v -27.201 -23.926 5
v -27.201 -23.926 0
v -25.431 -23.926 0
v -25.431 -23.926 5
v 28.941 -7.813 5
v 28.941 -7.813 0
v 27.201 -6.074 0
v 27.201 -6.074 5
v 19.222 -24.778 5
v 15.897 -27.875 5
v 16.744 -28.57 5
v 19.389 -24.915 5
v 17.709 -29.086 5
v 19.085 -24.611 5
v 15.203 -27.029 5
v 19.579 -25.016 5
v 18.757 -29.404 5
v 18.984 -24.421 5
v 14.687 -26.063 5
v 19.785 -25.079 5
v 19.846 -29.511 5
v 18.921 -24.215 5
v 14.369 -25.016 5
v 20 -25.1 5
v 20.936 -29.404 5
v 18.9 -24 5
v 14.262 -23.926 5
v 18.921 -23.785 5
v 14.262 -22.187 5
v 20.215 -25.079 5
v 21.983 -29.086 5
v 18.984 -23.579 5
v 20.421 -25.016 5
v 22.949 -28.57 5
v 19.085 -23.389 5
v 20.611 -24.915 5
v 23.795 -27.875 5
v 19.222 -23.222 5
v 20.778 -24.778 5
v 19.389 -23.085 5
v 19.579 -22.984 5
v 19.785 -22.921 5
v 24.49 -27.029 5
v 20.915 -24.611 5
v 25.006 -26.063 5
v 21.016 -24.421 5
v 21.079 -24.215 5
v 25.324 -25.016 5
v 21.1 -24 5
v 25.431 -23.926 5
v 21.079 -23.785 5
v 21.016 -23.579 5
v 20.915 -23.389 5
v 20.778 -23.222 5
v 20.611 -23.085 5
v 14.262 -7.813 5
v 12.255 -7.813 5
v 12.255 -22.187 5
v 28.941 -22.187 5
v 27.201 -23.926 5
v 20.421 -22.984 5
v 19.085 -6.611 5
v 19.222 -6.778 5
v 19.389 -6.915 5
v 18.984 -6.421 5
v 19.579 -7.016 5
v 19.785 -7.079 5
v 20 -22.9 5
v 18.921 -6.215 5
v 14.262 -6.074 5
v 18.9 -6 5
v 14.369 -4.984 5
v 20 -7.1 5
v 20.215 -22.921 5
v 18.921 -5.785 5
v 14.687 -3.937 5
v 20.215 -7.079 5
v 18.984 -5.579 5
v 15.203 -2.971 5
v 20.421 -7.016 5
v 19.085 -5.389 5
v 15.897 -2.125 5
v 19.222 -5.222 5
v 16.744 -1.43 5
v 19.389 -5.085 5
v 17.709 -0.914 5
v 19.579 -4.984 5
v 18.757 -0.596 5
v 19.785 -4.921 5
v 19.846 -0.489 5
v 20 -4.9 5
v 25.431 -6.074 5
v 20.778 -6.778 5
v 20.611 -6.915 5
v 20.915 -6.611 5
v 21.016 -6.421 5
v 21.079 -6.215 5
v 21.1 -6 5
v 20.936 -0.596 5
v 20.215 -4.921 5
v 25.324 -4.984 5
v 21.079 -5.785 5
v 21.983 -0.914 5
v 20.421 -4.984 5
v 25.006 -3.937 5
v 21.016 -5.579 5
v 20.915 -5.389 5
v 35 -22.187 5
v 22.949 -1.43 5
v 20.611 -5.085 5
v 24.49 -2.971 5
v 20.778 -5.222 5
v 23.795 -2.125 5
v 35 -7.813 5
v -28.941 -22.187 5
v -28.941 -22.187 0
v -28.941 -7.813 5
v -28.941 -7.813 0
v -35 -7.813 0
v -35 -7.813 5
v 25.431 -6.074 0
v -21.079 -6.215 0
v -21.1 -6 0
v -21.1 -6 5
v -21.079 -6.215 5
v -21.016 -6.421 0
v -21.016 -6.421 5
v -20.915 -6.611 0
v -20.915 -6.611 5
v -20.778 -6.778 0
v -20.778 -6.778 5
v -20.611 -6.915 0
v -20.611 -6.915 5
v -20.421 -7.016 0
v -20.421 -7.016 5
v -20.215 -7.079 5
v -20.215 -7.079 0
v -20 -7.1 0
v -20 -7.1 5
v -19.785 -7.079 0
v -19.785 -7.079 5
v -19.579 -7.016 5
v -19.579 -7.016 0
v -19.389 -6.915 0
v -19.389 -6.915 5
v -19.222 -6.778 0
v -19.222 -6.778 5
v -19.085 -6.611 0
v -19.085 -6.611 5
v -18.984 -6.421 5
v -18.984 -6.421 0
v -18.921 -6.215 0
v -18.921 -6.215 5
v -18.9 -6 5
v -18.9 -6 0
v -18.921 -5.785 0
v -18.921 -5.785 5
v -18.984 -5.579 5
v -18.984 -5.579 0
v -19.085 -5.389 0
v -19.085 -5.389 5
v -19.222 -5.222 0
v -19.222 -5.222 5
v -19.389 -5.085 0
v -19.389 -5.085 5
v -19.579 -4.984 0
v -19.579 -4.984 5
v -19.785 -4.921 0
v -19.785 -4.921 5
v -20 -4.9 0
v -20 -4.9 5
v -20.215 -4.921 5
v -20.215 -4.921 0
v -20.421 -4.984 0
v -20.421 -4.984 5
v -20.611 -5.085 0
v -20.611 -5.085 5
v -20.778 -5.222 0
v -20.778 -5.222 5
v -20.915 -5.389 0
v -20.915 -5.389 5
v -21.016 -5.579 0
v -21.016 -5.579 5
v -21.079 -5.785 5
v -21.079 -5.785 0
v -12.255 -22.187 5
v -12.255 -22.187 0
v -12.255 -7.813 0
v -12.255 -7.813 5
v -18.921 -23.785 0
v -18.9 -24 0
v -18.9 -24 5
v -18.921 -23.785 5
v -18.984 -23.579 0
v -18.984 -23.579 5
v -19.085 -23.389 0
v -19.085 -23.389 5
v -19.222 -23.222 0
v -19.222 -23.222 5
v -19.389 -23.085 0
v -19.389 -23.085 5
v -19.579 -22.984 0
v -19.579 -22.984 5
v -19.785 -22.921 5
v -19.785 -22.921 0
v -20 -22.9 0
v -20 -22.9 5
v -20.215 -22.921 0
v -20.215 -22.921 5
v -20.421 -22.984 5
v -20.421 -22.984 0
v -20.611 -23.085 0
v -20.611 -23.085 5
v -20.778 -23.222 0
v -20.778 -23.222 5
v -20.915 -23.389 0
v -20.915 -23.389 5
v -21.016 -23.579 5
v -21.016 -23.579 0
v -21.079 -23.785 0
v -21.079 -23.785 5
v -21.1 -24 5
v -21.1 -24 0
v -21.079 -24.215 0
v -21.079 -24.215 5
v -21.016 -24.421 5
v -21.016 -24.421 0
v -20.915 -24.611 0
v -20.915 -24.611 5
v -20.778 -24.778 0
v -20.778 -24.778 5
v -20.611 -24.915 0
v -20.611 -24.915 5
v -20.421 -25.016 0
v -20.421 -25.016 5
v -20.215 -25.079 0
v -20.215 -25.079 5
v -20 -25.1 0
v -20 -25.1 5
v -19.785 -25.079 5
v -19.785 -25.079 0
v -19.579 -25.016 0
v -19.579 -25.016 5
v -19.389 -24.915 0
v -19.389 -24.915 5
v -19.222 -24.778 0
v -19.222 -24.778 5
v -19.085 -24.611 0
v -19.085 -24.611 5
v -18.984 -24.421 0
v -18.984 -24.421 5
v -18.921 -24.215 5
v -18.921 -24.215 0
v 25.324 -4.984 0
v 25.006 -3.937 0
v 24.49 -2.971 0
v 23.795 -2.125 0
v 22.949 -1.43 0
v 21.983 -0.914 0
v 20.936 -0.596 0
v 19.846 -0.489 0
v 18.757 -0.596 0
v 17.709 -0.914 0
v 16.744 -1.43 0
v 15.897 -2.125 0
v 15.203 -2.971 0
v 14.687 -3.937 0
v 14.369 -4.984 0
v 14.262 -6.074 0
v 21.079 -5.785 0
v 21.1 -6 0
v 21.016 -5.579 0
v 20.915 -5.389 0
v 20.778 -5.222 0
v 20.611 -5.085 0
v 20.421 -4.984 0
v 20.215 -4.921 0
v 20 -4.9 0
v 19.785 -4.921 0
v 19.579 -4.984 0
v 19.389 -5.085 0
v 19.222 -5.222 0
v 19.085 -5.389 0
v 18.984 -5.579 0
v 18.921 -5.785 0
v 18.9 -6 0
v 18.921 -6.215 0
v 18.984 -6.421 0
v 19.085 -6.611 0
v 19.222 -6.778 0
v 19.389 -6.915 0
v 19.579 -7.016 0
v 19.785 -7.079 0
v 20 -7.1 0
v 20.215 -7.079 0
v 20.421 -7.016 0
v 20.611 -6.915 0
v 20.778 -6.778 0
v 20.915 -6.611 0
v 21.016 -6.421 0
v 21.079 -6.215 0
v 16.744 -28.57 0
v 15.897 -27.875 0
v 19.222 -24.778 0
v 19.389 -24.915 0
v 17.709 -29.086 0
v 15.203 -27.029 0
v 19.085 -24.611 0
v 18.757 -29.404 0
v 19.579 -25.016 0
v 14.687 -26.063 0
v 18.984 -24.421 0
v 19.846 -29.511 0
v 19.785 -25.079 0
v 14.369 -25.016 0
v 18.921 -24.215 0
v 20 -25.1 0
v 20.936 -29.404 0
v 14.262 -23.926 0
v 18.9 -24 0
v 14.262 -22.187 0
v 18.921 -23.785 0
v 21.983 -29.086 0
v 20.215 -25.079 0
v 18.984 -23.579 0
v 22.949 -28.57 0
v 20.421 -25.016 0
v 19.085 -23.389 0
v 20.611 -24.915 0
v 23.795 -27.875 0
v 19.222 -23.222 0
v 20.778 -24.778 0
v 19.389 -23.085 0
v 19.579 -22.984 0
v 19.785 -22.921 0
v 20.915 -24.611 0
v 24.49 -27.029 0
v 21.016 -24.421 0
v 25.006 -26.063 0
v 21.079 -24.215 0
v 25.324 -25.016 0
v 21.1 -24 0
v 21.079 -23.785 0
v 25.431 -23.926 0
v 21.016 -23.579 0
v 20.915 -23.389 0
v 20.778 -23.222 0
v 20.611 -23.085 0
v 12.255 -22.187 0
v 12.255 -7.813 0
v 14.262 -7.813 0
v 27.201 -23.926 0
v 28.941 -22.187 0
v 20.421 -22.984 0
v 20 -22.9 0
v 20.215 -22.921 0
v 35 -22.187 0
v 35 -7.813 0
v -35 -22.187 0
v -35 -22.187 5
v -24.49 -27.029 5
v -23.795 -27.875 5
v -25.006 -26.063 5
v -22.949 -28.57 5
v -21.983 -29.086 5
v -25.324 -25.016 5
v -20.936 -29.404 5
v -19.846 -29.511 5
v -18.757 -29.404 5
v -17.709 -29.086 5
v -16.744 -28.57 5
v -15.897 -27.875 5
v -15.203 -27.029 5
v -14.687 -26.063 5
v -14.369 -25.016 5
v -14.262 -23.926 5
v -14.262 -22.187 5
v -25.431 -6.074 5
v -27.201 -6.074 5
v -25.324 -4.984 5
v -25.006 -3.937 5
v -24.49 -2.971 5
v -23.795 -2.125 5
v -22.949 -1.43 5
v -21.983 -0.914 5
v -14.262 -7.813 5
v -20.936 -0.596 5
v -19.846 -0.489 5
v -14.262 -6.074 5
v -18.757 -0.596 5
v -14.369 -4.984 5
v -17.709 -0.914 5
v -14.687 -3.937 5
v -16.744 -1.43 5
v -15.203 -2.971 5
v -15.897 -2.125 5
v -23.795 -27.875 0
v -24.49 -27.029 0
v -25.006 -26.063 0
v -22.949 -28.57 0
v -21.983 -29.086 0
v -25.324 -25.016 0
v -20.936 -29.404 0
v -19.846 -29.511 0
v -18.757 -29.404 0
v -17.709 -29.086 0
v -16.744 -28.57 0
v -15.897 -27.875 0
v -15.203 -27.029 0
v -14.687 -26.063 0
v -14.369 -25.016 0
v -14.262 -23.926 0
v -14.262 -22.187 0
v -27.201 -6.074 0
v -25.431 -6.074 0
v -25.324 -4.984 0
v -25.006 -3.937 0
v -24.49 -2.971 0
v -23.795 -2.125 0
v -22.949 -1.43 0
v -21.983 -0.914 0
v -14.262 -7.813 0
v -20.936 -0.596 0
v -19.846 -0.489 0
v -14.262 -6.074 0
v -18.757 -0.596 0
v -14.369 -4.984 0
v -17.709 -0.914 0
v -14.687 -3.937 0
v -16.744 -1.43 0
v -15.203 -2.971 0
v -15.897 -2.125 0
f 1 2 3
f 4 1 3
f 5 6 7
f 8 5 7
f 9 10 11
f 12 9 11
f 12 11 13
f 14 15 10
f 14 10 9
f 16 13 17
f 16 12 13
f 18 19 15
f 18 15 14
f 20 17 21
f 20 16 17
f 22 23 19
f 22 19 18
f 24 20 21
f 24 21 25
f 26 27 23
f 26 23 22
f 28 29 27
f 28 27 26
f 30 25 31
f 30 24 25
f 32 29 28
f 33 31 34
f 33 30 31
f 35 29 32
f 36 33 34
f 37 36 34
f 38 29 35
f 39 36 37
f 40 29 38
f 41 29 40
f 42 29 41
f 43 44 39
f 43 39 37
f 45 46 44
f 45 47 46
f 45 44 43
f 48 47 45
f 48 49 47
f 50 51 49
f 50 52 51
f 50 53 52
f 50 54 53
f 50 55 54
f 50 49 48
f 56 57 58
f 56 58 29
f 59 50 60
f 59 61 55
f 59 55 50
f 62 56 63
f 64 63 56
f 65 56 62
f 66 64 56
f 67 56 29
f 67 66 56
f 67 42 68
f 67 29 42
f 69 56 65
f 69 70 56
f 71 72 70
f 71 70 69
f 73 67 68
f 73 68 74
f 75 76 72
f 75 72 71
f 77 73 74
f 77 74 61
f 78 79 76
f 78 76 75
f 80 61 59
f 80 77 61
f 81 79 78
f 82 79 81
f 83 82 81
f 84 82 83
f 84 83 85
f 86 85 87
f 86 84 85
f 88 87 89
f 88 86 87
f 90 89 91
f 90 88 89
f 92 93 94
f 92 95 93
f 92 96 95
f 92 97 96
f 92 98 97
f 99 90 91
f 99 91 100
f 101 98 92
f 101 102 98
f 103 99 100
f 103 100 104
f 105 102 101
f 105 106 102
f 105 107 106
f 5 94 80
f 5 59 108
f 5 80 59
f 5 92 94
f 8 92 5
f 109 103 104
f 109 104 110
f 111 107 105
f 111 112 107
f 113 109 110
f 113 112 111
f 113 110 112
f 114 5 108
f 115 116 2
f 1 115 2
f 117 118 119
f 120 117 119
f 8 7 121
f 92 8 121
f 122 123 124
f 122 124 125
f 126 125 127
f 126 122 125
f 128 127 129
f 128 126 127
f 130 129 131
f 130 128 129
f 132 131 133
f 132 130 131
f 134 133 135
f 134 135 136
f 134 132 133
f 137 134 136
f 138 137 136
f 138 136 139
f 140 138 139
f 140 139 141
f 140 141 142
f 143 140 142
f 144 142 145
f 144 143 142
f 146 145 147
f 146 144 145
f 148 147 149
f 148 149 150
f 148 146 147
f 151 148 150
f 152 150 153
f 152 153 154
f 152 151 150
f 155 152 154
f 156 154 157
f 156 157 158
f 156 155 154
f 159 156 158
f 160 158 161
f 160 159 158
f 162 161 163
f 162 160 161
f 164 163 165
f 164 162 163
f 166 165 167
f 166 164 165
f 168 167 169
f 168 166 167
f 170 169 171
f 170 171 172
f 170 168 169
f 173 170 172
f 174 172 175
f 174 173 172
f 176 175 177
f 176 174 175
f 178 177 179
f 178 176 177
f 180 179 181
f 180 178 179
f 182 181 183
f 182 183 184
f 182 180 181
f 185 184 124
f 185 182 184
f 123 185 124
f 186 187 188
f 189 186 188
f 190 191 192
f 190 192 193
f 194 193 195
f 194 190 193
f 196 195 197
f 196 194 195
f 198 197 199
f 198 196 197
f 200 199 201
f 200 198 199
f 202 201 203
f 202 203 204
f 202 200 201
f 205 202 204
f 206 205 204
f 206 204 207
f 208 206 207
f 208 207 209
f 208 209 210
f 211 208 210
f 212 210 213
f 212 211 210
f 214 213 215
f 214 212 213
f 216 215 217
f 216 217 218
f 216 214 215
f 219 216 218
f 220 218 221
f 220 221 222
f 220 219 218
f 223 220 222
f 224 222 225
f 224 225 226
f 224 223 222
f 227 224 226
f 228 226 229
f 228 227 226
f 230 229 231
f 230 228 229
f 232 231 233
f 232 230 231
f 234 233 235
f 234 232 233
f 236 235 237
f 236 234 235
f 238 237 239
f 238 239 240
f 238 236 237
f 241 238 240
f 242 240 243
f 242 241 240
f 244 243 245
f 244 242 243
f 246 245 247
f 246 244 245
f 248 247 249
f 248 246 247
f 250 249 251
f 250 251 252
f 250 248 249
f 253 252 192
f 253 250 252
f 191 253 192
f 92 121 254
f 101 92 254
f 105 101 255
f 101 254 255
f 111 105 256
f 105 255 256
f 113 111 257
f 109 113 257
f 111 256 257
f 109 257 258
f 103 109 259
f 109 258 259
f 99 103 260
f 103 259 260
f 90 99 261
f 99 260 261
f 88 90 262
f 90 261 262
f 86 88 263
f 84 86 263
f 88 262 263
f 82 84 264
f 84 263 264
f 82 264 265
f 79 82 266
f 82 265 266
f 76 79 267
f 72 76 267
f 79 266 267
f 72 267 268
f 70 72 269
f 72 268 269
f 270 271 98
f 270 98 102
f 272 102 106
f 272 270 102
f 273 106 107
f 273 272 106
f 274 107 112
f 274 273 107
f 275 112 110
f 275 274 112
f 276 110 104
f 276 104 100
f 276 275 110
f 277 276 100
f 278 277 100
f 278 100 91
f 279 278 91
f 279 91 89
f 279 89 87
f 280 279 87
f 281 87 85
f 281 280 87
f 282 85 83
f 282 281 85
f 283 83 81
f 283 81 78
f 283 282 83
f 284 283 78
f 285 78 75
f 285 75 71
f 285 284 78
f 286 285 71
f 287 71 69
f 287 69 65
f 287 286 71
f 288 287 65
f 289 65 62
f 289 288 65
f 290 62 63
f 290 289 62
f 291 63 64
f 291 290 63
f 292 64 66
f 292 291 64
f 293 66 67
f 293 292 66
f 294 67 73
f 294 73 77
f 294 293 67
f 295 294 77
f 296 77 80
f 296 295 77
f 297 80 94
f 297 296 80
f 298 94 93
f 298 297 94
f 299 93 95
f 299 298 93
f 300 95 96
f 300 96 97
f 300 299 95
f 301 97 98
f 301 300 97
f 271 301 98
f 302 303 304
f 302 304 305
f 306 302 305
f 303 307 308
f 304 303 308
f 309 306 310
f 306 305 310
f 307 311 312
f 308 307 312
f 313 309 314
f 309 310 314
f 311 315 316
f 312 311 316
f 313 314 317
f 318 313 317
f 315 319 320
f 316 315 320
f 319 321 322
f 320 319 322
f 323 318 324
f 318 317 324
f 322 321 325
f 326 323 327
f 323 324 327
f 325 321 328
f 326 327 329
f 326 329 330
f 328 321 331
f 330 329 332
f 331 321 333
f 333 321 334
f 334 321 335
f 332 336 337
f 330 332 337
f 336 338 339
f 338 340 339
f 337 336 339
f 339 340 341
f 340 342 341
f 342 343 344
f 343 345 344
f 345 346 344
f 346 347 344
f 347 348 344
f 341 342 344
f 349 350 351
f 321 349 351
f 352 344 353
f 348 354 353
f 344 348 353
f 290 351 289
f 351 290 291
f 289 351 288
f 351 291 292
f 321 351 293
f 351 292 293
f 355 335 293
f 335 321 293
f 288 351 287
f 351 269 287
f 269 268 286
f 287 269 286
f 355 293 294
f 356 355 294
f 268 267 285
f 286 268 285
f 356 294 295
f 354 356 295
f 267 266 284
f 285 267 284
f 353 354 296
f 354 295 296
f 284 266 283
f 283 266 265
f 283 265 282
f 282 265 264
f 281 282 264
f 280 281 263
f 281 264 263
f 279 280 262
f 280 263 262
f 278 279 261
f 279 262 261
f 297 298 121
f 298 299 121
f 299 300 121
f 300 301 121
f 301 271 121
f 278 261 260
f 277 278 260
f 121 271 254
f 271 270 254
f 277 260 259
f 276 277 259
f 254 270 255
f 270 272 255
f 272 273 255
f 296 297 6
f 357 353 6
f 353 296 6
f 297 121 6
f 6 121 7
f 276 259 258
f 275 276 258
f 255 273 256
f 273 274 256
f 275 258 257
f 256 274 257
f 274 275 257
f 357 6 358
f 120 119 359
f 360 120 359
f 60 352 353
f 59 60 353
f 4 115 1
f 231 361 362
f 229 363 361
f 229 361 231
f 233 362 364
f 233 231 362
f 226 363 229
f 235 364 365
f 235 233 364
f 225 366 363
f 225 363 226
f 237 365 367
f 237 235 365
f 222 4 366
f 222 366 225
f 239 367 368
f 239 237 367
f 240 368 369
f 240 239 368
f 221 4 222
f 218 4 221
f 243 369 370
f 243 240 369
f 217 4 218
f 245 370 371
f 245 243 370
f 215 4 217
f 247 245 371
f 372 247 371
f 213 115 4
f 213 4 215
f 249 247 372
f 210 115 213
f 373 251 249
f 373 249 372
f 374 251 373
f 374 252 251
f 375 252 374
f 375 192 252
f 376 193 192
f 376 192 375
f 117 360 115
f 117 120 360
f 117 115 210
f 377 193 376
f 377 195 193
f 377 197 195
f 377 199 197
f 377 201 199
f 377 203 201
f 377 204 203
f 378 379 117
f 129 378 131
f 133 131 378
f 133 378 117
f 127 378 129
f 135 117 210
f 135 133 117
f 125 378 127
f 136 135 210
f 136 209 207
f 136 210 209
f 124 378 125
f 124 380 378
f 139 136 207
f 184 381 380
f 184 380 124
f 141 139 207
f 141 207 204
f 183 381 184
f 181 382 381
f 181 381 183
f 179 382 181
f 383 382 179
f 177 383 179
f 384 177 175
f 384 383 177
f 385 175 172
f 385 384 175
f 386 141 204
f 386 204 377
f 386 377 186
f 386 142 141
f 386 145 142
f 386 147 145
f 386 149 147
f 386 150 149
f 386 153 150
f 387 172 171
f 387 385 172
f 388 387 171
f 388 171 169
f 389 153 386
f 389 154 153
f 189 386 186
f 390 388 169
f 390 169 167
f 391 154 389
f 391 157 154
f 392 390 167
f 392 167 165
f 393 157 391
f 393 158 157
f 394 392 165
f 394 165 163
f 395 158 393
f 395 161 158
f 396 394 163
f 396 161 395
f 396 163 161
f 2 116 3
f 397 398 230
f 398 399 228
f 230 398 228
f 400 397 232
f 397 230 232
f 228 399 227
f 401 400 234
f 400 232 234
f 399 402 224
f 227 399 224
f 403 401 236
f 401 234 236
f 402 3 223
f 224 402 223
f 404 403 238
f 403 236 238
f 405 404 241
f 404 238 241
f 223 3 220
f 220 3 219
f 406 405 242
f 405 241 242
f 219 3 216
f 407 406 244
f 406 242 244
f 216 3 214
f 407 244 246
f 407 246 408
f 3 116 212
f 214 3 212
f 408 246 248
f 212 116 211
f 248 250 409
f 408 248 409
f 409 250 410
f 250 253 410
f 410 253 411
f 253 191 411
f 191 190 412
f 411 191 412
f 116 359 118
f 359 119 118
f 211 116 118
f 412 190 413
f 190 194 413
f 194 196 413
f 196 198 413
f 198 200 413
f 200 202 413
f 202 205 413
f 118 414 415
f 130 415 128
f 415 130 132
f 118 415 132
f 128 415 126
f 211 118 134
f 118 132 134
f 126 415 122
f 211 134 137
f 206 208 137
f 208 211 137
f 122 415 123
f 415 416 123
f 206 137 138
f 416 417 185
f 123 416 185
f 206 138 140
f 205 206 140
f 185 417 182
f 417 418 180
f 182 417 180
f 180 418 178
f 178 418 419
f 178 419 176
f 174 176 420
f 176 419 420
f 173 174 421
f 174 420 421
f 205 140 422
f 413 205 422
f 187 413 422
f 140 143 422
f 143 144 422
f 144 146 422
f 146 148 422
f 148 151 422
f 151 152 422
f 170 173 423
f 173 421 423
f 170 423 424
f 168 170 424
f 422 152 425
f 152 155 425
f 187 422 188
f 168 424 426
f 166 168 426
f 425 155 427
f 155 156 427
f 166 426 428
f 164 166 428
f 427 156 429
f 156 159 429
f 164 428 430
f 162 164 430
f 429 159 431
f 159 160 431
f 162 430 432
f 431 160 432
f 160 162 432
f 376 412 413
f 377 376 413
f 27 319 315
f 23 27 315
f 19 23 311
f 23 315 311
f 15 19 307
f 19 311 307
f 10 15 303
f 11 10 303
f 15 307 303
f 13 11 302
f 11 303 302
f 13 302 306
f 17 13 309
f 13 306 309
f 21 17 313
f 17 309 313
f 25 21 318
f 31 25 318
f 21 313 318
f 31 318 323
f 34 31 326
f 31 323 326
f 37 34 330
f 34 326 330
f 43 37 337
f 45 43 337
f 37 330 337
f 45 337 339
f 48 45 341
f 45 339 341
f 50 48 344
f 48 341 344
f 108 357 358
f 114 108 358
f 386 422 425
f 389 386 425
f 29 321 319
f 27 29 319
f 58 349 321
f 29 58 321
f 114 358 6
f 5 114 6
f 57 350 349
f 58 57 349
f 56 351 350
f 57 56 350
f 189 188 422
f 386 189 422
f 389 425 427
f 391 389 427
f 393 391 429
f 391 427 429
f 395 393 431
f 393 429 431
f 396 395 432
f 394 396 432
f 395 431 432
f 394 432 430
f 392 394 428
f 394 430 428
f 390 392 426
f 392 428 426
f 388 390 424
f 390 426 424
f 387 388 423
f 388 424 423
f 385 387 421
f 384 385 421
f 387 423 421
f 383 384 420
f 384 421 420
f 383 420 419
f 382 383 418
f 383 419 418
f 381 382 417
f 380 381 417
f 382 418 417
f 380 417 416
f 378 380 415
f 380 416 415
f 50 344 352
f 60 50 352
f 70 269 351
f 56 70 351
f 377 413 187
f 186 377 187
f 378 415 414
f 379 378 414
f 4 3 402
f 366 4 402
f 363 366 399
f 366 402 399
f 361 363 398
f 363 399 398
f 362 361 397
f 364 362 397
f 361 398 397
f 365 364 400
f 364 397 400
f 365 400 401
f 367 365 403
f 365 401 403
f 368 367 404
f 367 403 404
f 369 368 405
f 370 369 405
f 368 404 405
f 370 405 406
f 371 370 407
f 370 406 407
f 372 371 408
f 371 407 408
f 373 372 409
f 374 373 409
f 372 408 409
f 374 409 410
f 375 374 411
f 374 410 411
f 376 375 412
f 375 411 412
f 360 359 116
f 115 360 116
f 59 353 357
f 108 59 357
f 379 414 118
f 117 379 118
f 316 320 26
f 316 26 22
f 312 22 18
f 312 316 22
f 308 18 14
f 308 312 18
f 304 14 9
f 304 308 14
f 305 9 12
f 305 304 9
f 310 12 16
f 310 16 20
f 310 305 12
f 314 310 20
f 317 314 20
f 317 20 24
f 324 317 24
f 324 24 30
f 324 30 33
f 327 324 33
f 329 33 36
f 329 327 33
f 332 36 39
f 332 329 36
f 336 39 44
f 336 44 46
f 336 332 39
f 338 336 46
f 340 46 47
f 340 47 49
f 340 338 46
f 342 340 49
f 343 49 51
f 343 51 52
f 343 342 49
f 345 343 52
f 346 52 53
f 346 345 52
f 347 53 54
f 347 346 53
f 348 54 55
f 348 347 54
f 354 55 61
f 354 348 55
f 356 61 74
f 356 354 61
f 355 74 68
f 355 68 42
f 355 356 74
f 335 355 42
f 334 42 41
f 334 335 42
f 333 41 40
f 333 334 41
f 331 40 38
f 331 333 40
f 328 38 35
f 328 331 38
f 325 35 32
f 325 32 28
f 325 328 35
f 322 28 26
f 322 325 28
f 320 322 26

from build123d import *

# Parameters (mm, degrees)
SKETCH1_R             = 1.1
BOSS_EXTRUDE2_DEPTH   = 5
BOSS_EXTRUDE2_2_DEPTH = 5


with BuildPart() as part:
    # Sketch1 → Boss-Extrude2 (new body)
    with BuildSketch(Plane.XY):
        with BuildLine():
            Line((-35, -22.186834718), (-28.940723539, -22.186834718))
            Line((-28.940723539, -22.186834718), (-27.201404344, -23.926153914))
            Line((-27.201404344, -23.926153914), (-25.430875053, -23.926153914))
            ThreePointArc((-25.430875053, -23.926153914), (-19.846202254, -29.510826713), (-14.261529454, -23.926153914))
            Line((-14.261529454, -23.926153914), (-14.261529454, -22.186834718))
            Line((-14.261529454, -22.186834718), (-12.254990306, -22.186834718))
            Line((-12.254990306, -22.186834718), (-12.254990306, -7.813165282))
            Line((-12.254990306, -7.813165282), (-14.261529454, -7.813165282))
            Line((-14.261529454, -7.813165282), (-14.261529454, -6.073846086))
            ThreePointArc((-14.261529454, -6.073846086), (-19.846202254, -0.489173287), (-25.430875053, -6.073846086))
            Line((-25.430875053, -6.073846086), (-27.201404344, -6.073846086))
            Line((-27.201404344, -6.073846086), (-28.940723539, -7.813165282))
            Line((-28.940723539, -7.813165282), (-35, -7.813165282))
            Line((-35, -7.813165282), (-35, -22.186834718))
        make_face()
        with Locations((-20, -24)):
            Circle(SKETCH1_R, mode=Mode.SUBTRACT)
        with Locations(Location((-20, -6, 0), (0, 0, 180))):
            Circle(SKETCH1_R, mode=Mode.SUBTRACT)
    extrude(amount=BOSS_EXTRUDE2_DEPTH)


with BuildPart() as body_2:
    # Sketch1 → Boss-Extrude2 2 (new body)
    with BuildSketch(Plane.XY):
        with BuildLine():
            Line((35, -7.813165282), (28.940723539, -7.813165282))
            Line((28.940723539, -7.813165282), (27.201404344, -6.073846086))
            Line((27.201404344, -6.073846086), (25.430875053, -6.073846086))
            ThreePointArc((25.430875053, -6.073846086), (19.846202254, -0.489173287), (14.261529454, -6.073846086))
            Line((14.261529454, -6.073846086), (14.261529454, -7.813165282))
            Line((14.261529454, -7.813165282), (12.254990306, -7.813165282))
            Line((12.254990306, -7.813165282), (12.254990306, -22.186834718))
            Line((12.254990306, -22.186834718), (14.261529454, -22.186834718))
            Line((14.261529454, -22.186834718), (14.261529454, -23.926153914))
            ThreePointArc((14.261529454, -23.926153914), (19.846202254, -29.510826713), (25.430875053, -23.926153914))
            Line((25.430875053, -23.926153914), (27.201404344, -23.926153914))
            Line((27.201404344, -23.926153914), (28.940723539, -22.186834718))
            Line((28.940723539, -22.186834718), (35, -22.186834718))
            Line((35, -22.186834718), (35, -7.813165282))
        make_face()
        with Locations((20, -6)):
            Circle(SKETCH1_R, mode=Mode.SUBTRACT)
        with Locations(Location((20, -24, 0), (0, 0, 180))):
            Circle(SKETCH1_R, mode=Mode.SUBTRACT)
    extrude(amount=BOSS_EXTRUDE2_2_DEPTH)


solid = Compound([part.part, body_2.part])
